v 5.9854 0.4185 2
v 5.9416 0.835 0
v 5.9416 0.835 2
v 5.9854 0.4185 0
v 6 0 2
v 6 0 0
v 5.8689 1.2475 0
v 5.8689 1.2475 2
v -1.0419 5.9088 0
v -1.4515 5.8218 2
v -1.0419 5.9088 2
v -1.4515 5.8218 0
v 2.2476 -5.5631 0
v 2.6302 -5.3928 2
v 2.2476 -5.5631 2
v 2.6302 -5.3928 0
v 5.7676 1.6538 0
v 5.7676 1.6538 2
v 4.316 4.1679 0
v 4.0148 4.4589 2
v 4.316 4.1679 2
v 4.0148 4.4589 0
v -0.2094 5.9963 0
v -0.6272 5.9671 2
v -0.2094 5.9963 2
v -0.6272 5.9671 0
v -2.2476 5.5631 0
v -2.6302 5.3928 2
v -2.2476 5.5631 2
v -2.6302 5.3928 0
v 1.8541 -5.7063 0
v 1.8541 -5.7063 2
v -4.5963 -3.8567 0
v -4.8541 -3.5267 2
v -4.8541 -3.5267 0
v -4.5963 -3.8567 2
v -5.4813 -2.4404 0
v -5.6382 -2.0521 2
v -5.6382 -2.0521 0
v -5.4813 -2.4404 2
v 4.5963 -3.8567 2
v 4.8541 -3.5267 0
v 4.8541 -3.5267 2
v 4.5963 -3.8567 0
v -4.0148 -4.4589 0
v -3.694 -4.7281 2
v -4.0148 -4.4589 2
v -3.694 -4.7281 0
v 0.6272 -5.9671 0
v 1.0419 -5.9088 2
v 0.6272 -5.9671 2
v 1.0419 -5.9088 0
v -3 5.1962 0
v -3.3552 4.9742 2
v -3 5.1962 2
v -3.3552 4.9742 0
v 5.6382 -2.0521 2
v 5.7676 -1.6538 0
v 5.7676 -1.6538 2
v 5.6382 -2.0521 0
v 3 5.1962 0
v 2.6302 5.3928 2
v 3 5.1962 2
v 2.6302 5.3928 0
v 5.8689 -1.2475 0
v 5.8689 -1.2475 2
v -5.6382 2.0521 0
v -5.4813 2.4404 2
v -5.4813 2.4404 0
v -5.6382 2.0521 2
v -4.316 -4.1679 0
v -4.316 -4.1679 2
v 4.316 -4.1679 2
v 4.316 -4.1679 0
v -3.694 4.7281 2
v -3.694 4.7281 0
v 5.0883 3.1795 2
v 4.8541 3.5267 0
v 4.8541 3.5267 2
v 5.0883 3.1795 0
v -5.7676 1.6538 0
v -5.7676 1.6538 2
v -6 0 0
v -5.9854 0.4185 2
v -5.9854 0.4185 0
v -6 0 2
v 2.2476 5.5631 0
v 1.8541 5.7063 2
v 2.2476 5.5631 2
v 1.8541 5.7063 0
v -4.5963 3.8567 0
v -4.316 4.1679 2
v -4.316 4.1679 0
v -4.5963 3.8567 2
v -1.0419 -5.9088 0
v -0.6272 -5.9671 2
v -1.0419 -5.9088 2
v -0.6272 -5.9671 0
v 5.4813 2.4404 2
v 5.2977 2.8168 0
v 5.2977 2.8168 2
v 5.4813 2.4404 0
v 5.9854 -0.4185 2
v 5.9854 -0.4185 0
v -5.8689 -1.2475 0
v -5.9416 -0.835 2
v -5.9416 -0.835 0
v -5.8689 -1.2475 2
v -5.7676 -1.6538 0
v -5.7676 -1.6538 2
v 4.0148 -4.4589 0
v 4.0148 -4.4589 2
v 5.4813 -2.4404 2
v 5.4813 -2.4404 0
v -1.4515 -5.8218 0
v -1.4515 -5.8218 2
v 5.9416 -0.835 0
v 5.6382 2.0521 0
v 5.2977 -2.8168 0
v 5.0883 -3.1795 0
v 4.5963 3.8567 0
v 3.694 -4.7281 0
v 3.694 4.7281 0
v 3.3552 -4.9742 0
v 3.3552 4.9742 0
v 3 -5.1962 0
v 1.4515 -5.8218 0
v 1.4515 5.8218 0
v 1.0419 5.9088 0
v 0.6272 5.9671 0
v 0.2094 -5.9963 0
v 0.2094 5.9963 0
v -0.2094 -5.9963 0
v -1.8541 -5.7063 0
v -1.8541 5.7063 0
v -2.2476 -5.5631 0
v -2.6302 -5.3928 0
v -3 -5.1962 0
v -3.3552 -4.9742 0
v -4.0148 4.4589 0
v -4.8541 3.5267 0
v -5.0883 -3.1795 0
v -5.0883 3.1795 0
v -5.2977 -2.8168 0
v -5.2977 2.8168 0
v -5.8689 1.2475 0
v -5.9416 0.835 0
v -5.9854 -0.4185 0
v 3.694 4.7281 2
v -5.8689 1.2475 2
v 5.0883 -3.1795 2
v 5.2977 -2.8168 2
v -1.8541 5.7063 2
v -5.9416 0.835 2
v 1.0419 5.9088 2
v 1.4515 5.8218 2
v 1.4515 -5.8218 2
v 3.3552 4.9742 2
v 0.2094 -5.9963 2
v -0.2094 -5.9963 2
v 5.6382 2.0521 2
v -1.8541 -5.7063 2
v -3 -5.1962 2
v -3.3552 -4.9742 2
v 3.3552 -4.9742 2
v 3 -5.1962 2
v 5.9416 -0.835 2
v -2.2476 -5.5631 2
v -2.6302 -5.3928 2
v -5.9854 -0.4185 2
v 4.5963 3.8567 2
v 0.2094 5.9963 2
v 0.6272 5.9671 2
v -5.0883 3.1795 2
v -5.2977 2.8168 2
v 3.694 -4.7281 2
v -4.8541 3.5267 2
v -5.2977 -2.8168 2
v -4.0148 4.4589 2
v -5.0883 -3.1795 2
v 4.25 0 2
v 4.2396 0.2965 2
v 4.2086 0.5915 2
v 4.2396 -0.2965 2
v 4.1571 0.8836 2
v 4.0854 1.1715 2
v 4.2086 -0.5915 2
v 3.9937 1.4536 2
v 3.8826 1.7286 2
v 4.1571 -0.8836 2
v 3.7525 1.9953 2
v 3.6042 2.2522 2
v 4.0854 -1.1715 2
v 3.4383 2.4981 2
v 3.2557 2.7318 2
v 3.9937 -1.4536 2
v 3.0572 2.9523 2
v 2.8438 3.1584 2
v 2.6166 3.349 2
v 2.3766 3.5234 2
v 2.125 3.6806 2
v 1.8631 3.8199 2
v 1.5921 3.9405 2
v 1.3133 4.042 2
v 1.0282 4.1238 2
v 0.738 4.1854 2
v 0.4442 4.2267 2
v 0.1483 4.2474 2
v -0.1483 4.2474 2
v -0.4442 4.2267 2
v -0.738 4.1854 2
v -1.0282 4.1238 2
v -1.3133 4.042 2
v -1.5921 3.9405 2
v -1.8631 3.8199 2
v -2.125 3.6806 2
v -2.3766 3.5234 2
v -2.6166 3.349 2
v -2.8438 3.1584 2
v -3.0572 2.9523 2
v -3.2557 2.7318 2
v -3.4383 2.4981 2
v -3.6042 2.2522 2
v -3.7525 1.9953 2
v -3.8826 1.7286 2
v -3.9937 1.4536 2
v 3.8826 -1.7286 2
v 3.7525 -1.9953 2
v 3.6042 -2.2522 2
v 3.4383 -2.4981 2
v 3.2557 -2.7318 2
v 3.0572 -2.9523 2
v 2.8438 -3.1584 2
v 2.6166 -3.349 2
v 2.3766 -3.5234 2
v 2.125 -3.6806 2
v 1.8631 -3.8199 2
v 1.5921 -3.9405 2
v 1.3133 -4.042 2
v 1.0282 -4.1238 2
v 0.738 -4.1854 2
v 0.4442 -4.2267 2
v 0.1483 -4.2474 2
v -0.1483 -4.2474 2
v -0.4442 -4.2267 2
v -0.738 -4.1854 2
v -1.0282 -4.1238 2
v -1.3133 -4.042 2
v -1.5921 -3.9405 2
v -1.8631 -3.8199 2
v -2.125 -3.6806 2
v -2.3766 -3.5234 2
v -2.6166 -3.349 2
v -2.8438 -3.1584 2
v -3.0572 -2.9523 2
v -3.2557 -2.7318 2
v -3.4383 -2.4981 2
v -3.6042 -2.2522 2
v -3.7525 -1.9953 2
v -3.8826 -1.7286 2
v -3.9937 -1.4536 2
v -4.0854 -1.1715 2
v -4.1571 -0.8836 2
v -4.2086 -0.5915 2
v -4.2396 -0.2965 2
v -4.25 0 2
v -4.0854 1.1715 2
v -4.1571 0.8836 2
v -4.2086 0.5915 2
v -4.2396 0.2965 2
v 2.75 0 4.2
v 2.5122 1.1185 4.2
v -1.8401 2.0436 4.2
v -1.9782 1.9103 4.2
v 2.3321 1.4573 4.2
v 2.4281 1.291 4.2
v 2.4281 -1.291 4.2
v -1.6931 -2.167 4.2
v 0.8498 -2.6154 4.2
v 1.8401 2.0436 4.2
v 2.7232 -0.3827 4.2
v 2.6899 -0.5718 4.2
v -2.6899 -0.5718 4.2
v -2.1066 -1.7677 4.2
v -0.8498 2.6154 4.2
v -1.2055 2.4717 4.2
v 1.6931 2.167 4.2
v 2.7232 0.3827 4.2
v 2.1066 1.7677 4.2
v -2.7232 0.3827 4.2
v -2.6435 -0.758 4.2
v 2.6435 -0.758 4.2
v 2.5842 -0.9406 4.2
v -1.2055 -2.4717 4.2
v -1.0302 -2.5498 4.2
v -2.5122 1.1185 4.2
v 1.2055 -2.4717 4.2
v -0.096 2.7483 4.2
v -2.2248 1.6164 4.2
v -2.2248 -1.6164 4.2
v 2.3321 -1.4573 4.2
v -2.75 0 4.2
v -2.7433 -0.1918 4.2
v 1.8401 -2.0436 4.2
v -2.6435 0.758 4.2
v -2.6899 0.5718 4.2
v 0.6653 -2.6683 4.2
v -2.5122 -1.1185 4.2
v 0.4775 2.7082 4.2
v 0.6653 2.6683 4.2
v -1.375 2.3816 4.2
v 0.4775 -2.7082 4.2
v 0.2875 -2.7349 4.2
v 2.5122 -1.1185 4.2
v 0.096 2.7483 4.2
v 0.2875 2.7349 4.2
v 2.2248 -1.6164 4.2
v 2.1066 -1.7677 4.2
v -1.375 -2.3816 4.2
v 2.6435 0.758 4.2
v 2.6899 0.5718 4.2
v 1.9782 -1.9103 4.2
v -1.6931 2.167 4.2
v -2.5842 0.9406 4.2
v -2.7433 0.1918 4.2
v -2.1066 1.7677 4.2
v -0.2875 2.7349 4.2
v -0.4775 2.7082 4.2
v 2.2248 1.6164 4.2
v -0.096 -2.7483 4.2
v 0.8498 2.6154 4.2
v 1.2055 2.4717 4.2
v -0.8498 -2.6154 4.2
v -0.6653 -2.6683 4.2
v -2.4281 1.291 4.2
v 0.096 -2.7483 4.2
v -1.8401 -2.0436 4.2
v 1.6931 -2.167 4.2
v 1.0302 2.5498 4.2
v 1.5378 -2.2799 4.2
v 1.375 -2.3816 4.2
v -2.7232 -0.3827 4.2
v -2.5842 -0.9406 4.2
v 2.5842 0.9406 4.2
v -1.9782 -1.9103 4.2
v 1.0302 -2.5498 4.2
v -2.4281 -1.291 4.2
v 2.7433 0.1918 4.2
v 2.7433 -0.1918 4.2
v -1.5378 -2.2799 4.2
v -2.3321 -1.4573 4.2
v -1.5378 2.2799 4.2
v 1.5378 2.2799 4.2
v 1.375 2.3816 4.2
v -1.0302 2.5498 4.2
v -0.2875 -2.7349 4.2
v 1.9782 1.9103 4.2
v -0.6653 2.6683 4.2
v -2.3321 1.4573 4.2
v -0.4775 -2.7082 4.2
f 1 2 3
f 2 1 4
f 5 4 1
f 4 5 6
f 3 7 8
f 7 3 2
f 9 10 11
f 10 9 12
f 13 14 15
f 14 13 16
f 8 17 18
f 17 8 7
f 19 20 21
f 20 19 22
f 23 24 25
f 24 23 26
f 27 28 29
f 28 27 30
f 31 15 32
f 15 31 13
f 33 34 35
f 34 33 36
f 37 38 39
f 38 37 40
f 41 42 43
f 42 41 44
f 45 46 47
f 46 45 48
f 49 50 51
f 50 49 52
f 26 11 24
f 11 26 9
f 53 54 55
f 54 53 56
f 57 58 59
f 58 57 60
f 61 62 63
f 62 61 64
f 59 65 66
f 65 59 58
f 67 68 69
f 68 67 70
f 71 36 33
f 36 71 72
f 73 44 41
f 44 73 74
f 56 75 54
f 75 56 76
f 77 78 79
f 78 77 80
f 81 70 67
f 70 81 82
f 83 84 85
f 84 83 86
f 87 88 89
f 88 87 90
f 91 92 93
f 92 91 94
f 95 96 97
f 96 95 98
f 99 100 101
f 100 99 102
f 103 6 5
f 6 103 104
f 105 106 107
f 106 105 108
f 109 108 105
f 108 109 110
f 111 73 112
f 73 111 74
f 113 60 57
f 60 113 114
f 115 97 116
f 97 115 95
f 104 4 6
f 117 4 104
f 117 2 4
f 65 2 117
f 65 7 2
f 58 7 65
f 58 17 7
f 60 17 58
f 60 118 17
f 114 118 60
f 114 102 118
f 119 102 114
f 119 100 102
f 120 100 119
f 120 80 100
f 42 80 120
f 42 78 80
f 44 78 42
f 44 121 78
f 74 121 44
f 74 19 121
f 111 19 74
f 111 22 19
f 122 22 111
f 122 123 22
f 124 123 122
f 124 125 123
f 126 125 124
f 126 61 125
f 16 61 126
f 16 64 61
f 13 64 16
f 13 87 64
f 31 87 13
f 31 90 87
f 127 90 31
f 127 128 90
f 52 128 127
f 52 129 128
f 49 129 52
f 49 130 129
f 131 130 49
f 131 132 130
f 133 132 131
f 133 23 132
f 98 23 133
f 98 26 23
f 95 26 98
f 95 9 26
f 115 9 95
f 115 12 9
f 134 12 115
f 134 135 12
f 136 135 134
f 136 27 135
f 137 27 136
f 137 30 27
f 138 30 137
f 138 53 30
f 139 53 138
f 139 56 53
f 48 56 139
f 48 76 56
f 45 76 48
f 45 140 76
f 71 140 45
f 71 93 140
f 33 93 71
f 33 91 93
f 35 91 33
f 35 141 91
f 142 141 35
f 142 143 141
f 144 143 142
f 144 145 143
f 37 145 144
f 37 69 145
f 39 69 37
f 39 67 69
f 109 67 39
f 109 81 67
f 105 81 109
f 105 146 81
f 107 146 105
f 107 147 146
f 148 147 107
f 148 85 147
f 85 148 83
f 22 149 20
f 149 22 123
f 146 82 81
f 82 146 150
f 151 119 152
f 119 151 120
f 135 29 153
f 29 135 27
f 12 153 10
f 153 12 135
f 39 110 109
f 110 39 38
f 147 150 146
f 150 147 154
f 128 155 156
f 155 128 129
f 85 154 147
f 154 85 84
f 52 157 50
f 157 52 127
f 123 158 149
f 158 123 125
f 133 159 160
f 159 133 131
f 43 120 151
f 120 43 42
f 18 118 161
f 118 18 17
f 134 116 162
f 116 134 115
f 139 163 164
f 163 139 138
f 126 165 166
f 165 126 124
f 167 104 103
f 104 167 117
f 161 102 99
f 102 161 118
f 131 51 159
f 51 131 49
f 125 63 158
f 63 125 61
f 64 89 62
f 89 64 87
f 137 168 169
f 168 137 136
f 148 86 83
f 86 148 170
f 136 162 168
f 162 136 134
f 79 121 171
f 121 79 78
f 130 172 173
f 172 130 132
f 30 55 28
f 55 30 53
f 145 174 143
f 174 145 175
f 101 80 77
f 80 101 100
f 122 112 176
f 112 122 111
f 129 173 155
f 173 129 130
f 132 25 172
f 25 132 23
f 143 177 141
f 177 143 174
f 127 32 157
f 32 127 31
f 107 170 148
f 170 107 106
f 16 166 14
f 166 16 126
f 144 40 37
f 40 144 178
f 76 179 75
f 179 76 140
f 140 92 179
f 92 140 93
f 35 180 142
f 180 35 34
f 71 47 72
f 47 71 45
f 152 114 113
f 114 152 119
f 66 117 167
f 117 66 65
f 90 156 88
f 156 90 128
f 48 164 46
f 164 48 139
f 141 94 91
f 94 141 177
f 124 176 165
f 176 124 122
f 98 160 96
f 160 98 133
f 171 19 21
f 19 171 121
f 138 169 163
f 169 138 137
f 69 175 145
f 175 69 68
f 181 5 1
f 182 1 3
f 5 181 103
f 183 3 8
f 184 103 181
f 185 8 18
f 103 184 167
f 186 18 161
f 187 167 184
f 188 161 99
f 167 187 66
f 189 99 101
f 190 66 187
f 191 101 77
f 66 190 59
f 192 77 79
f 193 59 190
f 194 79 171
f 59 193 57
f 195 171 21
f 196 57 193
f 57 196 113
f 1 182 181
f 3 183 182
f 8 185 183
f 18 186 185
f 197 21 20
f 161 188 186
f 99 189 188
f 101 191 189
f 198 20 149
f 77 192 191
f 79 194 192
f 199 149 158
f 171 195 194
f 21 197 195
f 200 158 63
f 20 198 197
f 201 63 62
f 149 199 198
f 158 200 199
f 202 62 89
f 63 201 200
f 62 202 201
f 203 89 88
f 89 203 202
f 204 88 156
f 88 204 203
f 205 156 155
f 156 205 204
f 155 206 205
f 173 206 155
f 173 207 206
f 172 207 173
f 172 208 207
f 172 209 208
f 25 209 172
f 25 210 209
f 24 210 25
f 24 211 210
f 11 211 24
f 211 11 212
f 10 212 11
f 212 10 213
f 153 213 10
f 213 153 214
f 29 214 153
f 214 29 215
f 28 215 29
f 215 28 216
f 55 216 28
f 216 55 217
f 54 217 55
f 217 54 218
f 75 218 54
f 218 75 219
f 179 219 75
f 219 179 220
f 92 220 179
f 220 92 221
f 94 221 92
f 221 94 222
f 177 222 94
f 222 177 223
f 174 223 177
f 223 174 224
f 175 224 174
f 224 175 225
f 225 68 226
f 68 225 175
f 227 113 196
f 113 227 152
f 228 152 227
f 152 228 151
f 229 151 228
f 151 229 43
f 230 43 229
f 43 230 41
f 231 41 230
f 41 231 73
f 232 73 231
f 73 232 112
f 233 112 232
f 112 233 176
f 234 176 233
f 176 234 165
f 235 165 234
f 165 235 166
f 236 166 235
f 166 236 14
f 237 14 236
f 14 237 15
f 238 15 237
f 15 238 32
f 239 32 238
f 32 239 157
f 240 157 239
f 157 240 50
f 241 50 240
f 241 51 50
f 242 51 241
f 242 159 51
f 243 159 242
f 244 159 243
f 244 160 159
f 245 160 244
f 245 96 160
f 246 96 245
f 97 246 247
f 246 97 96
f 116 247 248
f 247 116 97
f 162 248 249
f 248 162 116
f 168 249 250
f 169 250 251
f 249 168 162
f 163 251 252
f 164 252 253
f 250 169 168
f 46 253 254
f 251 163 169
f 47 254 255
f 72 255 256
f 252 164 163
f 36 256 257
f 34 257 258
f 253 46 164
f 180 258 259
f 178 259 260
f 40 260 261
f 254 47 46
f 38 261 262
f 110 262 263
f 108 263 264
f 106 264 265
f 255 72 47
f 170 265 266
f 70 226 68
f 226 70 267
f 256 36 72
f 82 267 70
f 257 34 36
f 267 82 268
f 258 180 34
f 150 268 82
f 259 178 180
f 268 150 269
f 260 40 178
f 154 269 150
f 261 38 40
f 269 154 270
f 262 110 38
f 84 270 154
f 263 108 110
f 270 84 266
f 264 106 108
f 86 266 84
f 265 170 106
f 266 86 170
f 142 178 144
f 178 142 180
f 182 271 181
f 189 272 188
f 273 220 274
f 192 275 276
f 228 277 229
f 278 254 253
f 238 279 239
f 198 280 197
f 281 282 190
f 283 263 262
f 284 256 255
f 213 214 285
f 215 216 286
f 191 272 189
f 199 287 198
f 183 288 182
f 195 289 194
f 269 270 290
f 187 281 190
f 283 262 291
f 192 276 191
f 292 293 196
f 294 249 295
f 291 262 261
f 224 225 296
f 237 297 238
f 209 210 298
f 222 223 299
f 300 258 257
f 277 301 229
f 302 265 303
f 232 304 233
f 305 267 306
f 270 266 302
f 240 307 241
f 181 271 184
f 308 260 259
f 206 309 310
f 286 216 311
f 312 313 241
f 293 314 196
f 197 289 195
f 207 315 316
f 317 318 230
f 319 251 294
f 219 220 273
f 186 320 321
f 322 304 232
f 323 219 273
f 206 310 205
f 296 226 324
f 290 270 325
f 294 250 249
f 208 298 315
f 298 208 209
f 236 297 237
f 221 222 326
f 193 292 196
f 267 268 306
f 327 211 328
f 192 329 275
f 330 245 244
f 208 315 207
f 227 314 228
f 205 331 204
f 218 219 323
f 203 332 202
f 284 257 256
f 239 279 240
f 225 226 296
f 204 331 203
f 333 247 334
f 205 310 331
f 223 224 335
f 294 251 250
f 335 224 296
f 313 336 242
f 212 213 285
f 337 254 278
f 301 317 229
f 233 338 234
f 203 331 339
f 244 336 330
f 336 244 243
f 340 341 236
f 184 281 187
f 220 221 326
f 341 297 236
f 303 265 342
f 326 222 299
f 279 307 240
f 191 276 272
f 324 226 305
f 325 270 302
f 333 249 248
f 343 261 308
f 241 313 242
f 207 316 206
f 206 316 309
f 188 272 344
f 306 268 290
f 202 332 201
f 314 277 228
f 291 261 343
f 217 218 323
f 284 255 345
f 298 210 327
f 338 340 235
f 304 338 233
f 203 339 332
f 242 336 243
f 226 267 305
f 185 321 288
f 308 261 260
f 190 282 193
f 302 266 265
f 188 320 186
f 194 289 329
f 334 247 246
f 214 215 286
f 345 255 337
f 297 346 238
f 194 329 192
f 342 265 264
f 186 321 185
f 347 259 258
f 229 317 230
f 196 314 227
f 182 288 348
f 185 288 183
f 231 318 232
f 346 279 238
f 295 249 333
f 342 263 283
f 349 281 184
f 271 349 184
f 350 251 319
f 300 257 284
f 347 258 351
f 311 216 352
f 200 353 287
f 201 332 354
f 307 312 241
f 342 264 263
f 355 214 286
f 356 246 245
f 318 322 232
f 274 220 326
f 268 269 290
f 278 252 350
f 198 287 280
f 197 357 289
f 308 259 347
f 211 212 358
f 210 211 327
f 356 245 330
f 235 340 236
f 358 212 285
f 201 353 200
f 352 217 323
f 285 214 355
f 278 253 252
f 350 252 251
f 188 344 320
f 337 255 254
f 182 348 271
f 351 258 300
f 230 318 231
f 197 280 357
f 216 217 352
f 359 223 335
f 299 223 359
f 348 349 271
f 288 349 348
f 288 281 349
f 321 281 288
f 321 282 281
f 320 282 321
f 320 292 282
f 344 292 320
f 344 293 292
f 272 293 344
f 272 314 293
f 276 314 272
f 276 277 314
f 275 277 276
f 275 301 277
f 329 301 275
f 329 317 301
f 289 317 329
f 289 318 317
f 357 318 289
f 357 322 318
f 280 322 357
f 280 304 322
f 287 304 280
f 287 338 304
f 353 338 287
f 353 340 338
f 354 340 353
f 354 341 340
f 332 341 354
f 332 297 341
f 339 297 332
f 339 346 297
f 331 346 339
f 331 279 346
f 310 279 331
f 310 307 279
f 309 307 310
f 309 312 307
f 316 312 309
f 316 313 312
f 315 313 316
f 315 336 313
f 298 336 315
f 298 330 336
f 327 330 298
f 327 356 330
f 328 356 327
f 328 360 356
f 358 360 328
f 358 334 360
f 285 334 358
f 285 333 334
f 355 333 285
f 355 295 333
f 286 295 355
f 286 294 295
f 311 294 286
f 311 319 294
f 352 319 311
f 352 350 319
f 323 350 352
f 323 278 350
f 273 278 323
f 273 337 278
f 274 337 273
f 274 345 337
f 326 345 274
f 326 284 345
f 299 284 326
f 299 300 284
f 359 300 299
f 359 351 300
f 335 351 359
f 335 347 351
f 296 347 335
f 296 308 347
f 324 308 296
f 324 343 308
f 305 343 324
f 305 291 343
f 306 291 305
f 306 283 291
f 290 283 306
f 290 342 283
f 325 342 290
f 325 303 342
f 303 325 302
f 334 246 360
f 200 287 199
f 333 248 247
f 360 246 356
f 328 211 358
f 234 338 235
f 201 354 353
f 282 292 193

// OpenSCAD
$fn=90;

cylinder(h=2, d=12);

translate([0,0,2])
cylinder(h=2.2, d1=8.5, d2=5.5);
